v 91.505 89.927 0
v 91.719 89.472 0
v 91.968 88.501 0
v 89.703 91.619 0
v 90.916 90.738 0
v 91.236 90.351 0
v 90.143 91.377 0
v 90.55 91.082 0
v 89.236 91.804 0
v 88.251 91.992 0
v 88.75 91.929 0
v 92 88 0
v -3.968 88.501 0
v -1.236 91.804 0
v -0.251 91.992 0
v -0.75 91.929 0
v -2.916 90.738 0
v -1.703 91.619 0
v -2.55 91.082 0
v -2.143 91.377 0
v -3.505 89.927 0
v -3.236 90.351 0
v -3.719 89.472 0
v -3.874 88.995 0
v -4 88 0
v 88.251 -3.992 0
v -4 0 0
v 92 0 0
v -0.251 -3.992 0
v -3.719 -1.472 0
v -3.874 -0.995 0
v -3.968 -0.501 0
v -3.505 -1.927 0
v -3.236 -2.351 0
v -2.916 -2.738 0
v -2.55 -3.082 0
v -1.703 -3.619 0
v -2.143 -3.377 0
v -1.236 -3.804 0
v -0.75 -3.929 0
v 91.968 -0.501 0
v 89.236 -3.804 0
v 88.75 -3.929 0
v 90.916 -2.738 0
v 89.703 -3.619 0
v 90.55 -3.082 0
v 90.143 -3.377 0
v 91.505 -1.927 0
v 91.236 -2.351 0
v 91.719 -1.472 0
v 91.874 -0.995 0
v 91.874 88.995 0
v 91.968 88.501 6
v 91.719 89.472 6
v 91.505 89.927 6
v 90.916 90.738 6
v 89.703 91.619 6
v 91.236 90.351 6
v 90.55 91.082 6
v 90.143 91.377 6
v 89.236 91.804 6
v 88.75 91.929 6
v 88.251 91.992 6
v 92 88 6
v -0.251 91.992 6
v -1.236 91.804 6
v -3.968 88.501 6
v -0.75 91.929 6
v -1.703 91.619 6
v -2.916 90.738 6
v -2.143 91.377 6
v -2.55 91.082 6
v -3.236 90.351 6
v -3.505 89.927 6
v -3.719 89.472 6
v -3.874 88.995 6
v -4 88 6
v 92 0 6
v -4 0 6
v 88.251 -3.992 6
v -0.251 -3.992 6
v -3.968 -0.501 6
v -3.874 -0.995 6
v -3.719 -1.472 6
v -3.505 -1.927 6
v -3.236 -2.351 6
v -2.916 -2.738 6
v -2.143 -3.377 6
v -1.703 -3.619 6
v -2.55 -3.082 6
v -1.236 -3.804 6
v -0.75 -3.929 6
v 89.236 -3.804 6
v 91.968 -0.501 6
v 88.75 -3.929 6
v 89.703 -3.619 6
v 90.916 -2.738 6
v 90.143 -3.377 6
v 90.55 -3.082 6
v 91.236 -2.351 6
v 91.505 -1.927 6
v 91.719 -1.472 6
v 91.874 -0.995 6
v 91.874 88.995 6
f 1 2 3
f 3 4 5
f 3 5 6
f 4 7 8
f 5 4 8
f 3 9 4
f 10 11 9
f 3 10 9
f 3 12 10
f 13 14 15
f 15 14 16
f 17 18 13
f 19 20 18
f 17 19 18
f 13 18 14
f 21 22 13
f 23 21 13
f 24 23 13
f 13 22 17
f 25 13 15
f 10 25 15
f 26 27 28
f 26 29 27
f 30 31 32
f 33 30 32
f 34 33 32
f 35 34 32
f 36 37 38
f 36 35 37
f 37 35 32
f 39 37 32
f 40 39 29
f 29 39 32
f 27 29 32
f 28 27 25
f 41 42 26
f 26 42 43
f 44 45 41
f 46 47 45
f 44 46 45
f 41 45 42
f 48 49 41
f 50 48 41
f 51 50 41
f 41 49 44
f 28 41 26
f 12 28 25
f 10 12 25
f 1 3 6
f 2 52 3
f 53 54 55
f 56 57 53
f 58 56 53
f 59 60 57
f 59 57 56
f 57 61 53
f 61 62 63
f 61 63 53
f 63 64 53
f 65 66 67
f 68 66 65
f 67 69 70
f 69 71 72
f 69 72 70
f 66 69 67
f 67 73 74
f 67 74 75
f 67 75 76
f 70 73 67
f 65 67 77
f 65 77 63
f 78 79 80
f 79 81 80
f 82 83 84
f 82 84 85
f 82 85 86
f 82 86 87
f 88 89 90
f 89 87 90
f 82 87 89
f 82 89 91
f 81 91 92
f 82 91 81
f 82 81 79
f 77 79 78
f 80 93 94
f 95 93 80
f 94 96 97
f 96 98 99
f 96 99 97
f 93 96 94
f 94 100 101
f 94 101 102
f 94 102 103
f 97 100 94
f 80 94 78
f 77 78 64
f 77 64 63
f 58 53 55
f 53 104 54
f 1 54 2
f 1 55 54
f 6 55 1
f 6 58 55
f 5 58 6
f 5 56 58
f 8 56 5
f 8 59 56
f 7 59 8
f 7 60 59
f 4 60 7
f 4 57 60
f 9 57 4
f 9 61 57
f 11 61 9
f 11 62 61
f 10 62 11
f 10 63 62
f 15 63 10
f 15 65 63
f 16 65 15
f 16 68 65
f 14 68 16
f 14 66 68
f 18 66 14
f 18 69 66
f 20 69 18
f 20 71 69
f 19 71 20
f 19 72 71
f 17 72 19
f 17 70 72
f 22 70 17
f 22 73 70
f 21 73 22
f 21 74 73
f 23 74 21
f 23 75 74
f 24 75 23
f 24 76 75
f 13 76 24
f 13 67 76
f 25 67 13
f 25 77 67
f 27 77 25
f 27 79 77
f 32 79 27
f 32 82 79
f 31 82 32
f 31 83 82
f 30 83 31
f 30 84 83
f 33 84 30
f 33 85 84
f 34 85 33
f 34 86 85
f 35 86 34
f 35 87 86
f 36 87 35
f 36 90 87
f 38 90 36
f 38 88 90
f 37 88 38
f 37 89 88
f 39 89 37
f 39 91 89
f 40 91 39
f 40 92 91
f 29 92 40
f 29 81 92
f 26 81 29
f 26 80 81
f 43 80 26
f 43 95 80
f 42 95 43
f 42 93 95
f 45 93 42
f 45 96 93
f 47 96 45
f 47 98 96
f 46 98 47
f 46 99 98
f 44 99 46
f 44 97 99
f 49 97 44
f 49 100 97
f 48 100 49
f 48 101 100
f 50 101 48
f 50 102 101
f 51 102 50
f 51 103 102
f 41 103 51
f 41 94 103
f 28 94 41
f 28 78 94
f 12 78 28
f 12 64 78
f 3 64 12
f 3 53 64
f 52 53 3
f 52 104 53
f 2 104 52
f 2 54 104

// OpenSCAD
a=96;
h=6;
r=4;

linear_extrude(h) {
  minkowski() {
    square(a-2*r);
    circle(r=r,$fn=50);
  }
}
